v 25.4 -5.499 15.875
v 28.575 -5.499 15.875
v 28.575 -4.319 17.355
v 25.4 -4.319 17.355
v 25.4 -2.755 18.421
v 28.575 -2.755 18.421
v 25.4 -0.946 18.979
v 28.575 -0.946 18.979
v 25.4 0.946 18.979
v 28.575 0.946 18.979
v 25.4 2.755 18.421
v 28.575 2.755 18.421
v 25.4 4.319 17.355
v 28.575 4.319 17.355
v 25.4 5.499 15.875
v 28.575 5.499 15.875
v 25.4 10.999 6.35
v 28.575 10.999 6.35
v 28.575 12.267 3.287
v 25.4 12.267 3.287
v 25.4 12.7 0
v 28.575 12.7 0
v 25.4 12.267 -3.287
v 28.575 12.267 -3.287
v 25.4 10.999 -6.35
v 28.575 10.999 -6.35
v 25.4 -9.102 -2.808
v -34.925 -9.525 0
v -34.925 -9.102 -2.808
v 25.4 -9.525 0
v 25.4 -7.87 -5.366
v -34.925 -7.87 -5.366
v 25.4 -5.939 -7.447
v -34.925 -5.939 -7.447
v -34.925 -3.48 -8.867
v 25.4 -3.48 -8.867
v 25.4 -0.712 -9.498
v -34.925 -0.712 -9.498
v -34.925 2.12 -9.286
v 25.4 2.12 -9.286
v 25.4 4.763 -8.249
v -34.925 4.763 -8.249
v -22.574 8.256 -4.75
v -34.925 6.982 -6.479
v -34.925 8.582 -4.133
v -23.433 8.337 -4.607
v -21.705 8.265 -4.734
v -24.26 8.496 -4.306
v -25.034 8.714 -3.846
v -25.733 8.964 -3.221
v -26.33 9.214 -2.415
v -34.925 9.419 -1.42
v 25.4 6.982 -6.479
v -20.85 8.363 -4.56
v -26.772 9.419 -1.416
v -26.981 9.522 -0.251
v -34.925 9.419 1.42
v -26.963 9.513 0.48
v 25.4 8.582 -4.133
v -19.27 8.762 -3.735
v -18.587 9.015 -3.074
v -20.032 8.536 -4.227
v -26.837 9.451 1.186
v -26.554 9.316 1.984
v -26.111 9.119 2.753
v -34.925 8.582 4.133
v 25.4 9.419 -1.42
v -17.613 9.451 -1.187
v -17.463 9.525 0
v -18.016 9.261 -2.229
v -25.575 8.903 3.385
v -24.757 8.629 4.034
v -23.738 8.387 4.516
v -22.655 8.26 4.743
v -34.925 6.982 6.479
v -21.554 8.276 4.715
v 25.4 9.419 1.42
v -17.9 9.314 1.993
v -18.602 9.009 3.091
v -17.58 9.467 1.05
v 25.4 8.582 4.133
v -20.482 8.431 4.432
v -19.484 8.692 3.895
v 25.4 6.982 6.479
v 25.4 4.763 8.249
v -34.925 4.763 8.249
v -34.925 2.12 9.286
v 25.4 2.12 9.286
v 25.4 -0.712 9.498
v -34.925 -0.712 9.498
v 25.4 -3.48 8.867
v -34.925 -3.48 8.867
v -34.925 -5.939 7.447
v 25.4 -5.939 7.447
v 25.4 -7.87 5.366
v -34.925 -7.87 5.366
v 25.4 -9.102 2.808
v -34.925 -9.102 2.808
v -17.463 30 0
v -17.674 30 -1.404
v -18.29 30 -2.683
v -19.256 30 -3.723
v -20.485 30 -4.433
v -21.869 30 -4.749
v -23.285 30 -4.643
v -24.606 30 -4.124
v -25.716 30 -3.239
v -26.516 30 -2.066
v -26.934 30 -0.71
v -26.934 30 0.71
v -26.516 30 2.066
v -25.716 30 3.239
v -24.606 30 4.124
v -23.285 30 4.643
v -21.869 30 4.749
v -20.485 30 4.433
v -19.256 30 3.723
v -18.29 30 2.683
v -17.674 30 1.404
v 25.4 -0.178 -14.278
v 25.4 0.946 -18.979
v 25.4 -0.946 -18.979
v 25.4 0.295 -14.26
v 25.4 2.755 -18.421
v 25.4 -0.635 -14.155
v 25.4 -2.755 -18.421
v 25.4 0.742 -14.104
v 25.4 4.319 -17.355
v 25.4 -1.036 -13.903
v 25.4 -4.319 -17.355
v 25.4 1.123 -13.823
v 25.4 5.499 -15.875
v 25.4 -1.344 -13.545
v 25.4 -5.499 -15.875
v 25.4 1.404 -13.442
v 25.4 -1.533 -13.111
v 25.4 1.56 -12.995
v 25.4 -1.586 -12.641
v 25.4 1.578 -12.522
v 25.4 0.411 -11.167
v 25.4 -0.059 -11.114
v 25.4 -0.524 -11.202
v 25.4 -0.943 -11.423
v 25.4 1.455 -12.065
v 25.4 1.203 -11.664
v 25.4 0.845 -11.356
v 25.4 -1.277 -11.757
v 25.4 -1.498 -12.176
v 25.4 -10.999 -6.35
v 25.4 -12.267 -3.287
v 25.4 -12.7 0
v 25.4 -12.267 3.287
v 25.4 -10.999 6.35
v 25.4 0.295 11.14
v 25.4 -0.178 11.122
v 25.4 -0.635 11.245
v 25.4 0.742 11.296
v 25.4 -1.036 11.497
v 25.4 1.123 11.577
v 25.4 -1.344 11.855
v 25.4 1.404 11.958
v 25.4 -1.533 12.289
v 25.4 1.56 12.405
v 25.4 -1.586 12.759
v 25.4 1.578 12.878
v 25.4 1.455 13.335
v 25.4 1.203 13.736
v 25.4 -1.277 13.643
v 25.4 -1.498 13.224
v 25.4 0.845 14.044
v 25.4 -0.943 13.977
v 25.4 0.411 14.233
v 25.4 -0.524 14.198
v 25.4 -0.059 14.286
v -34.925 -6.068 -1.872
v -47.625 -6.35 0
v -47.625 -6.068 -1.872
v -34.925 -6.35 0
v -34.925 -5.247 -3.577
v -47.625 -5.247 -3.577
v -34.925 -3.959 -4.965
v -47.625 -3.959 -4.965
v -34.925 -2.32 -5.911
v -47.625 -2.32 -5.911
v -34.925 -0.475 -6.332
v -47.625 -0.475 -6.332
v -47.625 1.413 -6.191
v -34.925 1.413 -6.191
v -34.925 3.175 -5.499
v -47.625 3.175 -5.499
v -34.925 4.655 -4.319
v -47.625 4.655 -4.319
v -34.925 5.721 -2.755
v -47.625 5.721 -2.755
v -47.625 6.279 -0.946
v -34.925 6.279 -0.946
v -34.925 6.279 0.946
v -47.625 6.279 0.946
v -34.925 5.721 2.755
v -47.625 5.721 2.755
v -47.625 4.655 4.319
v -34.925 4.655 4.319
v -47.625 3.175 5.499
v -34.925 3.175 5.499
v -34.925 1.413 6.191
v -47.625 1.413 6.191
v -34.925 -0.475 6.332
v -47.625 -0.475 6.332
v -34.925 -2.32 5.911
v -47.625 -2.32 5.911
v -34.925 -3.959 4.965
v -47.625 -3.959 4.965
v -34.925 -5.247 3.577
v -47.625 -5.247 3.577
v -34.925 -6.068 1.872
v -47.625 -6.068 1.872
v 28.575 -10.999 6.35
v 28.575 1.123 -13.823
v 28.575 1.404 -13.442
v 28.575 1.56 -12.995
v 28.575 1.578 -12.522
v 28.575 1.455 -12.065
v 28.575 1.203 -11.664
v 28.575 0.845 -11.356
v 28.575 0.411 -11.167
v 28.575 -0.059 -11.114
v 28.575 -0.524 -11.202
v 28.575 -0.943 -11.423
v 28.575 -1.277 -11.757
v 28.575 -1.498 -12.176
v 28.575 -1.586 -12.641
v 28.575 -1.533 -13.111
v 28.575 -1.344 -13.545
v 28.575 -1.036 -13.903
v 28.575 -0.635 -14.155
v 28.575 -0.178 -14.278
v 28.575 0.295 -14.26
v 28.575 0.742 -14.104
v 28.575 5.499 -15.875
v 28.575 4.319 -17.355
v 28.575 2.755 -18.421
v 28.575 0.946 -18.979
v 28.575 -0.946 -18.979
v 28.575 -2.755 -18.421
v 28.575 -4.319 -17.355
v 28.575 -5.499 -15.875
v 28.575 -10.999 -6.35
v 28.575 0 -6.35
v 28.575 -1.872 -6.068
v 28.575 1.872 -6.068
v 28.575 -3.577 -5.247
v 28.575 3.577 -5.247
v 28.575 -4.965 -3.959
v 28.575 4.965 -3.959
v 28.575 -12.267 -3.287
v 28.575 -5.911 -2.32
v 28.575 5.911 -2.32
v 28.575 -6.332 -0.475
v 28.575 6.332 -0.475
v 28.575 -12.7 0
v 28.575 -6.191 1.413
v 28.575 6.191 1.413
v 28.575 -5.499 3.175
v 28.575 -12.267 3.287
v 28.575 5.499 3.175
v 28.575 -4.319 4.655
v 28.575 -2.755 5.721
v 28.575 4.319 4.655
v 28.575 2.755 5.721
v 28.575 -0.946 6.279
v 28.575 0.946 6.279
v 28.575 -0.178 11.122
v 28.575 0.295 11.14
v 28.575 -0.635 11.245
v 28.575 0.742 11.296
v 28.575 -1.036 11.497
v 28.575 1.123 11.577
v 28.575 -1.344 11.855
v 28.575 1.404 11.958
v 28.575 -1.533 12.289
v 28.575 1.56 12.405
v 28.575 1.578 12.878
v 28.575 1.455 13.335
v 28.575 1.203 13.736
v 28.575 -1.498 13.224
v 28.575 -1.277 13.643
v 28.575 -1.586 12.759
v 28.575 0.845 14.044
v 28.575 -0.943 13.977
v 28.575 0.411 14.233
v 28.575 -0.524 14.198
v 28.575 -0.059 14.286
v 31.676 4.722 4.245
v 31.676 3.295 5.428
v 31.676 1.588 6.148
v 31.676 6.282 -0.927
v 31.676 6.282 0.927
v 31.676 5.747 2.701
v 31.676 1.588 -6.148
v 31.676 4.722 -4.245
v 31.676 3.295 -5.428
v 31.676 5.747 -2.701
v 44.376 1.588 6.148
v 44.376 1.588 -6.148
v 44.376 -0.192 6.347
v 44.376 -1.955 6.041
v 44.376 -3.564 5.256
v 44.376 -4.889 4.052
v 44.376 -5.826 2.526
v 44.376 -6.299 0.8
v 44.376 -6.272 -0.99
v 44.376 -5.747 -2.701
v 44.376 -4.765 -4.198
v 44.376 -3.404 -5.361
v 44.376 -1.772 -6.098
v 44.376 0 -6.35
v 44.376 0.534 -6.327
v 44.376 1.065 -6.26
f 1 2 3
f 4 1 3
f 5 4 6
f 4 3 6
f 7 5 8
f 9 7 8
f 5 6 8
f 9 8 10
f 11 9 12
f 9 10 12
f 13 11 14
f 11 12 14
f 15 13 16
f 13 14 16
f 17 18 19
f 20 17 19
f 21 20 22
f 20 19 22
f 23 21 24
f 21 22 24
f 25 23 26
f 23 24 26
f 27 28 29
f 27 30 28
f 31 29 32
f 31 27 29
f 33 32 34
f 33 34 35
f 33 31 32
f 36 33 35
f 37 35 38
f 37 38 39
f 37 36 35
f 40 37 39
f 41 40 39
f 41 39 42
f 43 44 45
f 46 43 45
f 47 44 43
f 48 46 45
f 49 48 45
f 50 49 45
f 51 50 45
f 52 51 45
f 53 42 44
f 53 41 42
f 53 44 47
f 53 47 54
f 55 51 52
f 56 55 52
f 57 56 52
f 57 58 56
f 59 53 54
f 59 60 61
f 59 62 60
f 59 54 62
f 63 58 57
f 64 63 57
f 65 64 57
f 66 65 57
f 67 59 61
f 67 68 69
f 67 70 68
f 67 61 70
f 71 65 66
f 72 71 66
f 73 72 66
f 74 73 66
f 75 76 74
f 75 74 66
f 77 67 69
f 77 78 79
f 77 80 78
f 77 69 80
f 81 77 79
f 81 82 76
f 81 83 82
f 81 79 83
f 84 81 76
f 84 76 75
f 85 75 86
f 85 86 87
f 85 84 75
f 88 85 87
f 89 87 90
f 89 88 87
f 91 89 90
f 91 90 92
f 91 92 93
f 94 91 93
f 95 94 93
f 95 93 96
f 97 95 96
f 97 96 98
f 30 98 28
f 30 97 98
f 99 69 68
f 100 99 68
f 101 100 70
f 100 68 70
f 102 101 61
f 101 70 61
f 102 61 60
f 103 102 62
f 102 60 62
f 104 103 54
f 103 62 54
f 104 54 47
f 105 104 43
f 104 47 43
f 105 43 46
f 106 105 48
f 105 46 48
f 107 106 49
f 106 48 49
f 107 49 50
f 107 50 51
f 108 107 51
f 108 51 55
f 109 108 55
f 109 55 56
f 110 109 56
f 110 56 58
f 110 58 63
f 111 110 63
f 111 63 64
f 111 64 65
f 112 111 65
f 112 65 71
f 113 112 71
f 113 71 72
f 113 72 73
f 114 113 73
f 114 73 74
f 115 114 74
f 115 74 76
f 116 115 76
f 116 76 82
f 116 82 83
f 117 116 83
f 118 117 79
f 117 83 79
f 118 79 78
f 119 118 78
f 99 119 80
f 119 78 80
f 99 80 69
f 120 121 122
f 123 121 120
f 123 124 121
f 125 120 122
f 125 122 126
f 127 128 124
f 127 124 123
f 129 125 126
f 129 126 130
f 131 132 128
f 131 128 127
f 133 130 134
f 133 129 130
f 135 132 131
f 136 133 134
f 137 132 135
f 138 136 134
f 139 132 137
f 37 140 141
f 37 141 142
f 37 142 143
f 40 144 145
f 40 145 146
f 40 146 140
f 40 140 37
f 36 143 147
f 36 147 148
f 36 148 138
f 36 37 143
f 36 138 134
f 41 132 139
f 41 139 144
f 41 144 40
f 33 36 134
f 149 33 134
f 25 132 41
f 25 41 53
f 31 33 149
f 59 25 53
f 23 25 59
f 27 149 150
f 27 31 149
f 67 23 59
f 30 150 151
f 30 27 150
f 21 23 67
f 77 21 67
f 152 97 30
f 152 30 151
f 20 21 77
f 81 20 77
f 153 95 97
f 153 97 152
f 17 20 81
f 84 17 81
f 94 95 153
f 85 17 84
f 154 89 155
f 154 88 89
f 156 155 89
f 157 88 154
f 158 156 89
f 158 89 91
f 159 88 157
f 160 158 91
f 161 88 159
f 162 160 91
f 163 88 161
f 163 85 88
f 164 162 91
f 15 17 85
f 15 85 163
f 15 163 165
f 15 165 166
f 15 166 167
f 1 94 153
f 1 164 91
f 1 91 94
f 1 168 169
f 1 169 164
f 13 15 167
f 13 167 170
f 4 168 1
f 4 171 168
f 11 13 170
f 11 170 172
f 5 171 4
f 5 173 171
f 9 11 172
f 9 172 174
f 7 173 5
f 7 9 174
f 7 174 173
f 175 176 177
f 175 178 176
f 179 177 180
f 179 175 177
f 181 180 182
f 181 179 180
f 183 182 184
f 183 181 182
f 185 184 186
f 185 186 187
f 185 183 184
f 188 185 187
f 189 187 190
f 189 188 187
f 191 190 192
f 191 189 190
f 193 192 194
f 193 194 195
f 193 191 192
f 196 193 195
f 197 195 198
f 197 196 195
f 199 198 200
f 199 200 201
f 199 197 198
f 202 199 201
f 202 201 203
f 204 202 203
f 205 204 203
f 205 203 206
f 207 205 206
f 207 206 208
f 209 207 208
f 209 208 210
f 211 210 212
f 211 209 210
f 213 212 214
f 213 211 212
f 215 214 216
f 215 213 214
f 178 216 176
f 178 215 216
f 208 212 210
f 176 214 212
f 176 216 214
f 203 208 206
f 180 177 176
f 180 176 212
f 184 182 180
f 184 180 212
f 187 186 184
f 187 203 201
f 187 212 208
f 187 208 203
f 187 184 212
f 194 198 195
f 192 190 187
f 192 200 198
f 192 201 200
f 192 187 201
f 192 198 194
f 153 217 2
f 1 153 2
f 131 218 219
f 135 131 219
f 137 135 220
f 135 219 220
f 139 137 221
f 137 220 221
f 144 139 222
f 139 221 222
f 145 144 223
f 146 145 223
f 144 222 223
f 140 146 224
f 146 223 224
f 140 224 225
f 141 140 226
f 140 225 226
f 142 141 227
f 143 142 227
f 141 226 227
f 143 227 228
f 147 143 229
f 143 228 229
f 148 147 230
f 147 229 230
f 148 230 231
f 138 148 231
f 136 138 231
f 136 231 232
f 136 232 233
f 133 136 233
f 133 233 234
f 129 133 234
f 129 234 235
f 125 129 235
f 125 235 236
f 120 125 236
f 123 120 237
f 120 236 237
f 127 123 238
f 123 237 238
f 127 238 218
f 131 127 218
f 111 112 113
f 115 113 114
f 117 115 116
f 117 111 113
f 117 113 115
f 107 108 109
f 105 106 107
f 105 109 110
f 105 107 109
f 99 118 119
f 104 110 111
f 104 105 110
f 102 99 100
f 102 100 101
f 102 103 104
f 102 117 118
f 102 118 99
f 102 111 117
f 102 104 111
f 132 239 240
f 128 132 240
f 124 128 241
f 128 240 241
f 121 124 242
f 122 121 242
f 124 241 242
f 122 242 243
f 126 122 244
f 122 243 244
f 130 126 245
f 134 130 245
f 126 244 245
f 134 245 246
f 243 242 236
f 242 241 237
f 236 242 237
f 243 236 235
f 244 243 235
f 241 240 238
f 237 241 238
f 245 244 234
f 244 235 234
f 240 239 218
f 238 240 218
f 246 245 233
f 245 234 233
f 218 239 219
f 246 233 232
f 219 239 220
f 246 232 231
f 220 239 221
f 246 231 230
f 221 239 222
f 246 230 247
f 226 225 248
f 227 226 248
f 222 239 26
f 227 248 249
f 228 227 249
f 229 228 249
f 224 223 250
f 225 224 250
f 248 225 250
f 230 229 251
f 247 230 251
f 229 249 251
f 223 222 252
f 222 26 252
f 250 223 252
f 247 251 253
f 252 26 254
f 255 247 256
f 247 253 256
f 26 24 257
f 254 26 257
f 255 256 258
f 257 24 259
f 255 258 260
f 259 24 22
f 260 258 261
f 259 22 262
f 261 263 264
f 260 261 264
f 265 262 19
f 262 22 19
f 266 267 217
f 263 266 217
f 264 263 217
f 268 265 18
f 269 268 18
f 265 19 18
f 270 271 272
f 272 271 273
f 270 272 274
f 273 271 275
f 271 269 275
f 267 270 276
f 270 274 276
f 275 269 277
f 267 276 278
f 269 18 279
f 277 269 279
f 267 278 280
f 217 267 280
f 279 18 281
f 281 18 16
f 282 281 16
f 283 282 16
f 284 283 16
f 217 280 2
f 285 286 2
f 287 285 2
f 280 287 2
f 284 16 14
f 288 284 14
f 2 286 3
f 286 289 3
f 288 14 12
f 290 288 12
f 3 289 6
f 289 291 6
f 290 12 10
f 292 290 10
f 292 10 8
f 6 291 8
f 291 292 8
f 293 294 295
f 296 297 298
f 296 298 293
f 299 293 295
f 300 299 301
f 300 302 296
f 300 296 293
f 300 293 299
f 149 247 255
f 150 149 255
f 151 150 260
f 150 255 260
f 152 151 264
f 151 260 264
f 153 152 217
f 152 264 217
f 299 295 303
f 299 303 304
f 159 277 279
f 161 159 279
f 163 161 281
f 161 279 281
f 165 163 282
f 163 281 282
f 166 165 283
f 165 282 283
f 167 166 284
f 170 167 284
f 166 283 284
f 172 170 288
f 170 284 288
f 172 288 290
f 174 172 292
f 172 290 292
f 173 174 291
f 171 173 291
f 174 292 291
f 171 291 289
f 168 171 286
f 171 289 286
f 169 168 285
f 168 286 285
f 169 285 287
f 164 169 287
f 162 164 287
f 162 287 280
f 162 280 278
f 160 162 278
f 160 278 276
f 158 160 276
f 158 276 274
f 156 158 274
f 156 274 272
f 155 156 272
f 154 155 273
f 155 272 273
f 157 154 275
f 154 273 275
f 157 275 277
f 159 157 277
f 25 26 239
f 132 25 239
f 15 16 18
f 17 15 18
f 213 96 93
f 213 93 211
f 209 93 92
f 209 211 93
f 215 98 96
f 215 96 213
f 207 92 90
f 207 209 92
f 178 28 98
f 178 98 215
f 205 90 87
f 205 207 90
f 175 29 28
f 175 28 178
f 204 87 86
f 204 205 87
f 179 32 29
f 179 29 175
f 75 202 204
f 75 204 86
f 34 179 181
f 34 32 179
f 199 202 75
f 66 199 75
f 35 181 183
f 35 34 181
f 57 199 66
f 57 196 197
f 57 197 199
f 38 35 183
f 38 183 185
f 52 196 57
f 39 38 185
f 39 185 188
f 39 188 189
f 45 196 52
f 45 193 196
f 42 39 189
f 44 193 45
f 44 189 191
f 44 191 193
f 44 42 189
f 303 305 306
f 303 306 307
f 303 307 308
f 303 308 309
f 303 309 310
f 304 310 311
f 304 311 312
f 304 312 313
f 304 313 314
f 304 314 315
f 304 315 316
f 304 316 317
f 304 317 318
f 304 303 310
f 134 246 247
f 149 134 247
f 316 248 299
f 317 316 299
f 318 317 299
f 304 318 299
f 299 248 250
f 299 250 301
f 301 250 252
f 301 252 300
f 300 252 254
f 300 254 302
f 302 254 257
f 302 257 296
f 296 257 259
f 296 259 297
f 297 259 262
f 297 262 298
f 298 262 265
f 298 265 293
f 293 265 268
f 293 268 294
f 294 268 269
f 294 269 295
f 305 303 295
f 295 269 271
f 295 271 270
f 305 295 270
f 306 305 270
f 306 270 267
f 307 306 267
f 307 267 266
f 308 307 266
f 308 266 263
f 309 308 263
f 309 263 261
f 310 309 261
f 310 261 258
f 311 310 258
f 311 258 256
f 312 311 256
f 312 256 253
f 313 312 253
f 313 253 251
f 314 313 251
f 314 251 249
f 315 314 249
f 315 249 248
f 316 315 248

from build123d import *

# Parameters (mm, degrees)
SKETCH7_R           = 1.5875
BOSS_EXTRUDE2_DEPTH = 3.175
SKETCH5_R           = 6.35
CUT_EXTRUDE1_DEPTH  = 41.348883888
SKETCH8_R           = 6.35
EXTRUDE1_DEPTH      = 57.15
CUT_EXTRUDE2_DEPTH  = 12.7
SKETCH10_R          = 4.7625
EXTRUDE2_DEPTH      = 30


with BuildPart() as part:
    # Sketch4 → Boss-Revolve2 (revolve)
    with BuildSketch(Plane.XY):
        Polygon((-47.625, 0), (-47.625, -6.35), (-34.925, -6.35), (-34.925, -9.525), (28.575, -9.525), (28.575, 0), align=None)
    revolve(axis=Axis((-47.625, 0, 0), (1, 0, 0)))

    # Sketch7 → Boss-Extrude2 (add)
    with BuildSketch(Plane(origin=(28.575, 29.318732004, 10.174246846), x_dir=(0, 0.707106781, -0.707106781), z_dir=(1, 0, 0))):
        with BuildLine():
            Line((-20.873950462, -12.811868036), (-10.250193405, -15.65849516))
            ThreePointArc((-10.250193405, -15.65849516), (-4.556939156, -18.945497033), (-1.269937284, -24.638751281))
            Line((-1.269937284, -24.638751281), (1.57668984, -35.262508339))
            ThreePointArc((1.57668984, -35.262508339), (-0.066811096, -41.396137336), (-6.200440093, -43.039638272))
            Line((-6.200440093, -43.039638272), (-16.82419715, -40.193011148))
            ThreePointArc((-16.82419715, -40.193011148), (-22.517451399, -36.906009275), (-25.804453271, -31.212755027))
            Line((-25.804453271, -31.212755027), (-28.651080396, -20.588997969))
            ThreePointArc((-28.651080396, -20.588997969), (-27.007579459, -14.455368972), (-20.873950462, -12.811868036))
        make_face()
        with Locations((-22.517451399, -18.945497033)):
            Circle(SKETCH7_R, mode=Mode.SUBTRACT)
        with Locations((-4.556939156, -36.906009275)):
            Circle(SKETCH7_R, mode=Mode.SUBTRACT)
    extrude(amount=-BOSS_EXTRUDE2_DEPTH)

    # Sketch5 → Cut-Extrude1 (cut)
    with BuildSketch(Plane(origin=(28.575, 0, 0), x_dir=(0, 0, -1), z_dir=(1, 0, 0))):
        Circle(SKETCH5_R)
    extrude(amount=-CUT_EXTRUDE1_DEPTH, mode=Mode.SUBTRACT)

    # Sketch8 → Extrude1 (add)
    with BuildSketch(Plane(origin=(-12.773883888, 0, 0), x_dir=(0, 0, -1), z_dir=(1, 0, 0))):
        Circle(SKETCH8_R)
    extrude(amount=EXTRUDE1_DEPTH)

    # Sketch9 → Cut-Extrude2 (cut)
    with BuildSketch(Plane(origin=(44.376116112, 0, 0), x_dir=(0, 0, -1), z_dir=(1, 0, 0))):
        with BuildLine():
            Line((-6.148361062, 1.5875), (6.148361062, 1.5875))
            ThreePointArc((6.148361062, 1.5875), (0, 6.35), (-6.148361062, 1.5875))
        make_face()
    extrude(amount=-CUT_EXTRUDE2_DEPTH, mode=Mode.SUBTRACT)

    # Sketch10 → Extrude2 (add)
    with BuildSketch(Plane(origin=(0, 0, 0), x_dir=(1, 0, 0), z_dir=(0, 1, 0))):
        with Locations((-22.225, 0)):
            Circle(SKETCH10_R)
    extrude(amount=EXTRUDE2_DEPTH)


solid = part.part
